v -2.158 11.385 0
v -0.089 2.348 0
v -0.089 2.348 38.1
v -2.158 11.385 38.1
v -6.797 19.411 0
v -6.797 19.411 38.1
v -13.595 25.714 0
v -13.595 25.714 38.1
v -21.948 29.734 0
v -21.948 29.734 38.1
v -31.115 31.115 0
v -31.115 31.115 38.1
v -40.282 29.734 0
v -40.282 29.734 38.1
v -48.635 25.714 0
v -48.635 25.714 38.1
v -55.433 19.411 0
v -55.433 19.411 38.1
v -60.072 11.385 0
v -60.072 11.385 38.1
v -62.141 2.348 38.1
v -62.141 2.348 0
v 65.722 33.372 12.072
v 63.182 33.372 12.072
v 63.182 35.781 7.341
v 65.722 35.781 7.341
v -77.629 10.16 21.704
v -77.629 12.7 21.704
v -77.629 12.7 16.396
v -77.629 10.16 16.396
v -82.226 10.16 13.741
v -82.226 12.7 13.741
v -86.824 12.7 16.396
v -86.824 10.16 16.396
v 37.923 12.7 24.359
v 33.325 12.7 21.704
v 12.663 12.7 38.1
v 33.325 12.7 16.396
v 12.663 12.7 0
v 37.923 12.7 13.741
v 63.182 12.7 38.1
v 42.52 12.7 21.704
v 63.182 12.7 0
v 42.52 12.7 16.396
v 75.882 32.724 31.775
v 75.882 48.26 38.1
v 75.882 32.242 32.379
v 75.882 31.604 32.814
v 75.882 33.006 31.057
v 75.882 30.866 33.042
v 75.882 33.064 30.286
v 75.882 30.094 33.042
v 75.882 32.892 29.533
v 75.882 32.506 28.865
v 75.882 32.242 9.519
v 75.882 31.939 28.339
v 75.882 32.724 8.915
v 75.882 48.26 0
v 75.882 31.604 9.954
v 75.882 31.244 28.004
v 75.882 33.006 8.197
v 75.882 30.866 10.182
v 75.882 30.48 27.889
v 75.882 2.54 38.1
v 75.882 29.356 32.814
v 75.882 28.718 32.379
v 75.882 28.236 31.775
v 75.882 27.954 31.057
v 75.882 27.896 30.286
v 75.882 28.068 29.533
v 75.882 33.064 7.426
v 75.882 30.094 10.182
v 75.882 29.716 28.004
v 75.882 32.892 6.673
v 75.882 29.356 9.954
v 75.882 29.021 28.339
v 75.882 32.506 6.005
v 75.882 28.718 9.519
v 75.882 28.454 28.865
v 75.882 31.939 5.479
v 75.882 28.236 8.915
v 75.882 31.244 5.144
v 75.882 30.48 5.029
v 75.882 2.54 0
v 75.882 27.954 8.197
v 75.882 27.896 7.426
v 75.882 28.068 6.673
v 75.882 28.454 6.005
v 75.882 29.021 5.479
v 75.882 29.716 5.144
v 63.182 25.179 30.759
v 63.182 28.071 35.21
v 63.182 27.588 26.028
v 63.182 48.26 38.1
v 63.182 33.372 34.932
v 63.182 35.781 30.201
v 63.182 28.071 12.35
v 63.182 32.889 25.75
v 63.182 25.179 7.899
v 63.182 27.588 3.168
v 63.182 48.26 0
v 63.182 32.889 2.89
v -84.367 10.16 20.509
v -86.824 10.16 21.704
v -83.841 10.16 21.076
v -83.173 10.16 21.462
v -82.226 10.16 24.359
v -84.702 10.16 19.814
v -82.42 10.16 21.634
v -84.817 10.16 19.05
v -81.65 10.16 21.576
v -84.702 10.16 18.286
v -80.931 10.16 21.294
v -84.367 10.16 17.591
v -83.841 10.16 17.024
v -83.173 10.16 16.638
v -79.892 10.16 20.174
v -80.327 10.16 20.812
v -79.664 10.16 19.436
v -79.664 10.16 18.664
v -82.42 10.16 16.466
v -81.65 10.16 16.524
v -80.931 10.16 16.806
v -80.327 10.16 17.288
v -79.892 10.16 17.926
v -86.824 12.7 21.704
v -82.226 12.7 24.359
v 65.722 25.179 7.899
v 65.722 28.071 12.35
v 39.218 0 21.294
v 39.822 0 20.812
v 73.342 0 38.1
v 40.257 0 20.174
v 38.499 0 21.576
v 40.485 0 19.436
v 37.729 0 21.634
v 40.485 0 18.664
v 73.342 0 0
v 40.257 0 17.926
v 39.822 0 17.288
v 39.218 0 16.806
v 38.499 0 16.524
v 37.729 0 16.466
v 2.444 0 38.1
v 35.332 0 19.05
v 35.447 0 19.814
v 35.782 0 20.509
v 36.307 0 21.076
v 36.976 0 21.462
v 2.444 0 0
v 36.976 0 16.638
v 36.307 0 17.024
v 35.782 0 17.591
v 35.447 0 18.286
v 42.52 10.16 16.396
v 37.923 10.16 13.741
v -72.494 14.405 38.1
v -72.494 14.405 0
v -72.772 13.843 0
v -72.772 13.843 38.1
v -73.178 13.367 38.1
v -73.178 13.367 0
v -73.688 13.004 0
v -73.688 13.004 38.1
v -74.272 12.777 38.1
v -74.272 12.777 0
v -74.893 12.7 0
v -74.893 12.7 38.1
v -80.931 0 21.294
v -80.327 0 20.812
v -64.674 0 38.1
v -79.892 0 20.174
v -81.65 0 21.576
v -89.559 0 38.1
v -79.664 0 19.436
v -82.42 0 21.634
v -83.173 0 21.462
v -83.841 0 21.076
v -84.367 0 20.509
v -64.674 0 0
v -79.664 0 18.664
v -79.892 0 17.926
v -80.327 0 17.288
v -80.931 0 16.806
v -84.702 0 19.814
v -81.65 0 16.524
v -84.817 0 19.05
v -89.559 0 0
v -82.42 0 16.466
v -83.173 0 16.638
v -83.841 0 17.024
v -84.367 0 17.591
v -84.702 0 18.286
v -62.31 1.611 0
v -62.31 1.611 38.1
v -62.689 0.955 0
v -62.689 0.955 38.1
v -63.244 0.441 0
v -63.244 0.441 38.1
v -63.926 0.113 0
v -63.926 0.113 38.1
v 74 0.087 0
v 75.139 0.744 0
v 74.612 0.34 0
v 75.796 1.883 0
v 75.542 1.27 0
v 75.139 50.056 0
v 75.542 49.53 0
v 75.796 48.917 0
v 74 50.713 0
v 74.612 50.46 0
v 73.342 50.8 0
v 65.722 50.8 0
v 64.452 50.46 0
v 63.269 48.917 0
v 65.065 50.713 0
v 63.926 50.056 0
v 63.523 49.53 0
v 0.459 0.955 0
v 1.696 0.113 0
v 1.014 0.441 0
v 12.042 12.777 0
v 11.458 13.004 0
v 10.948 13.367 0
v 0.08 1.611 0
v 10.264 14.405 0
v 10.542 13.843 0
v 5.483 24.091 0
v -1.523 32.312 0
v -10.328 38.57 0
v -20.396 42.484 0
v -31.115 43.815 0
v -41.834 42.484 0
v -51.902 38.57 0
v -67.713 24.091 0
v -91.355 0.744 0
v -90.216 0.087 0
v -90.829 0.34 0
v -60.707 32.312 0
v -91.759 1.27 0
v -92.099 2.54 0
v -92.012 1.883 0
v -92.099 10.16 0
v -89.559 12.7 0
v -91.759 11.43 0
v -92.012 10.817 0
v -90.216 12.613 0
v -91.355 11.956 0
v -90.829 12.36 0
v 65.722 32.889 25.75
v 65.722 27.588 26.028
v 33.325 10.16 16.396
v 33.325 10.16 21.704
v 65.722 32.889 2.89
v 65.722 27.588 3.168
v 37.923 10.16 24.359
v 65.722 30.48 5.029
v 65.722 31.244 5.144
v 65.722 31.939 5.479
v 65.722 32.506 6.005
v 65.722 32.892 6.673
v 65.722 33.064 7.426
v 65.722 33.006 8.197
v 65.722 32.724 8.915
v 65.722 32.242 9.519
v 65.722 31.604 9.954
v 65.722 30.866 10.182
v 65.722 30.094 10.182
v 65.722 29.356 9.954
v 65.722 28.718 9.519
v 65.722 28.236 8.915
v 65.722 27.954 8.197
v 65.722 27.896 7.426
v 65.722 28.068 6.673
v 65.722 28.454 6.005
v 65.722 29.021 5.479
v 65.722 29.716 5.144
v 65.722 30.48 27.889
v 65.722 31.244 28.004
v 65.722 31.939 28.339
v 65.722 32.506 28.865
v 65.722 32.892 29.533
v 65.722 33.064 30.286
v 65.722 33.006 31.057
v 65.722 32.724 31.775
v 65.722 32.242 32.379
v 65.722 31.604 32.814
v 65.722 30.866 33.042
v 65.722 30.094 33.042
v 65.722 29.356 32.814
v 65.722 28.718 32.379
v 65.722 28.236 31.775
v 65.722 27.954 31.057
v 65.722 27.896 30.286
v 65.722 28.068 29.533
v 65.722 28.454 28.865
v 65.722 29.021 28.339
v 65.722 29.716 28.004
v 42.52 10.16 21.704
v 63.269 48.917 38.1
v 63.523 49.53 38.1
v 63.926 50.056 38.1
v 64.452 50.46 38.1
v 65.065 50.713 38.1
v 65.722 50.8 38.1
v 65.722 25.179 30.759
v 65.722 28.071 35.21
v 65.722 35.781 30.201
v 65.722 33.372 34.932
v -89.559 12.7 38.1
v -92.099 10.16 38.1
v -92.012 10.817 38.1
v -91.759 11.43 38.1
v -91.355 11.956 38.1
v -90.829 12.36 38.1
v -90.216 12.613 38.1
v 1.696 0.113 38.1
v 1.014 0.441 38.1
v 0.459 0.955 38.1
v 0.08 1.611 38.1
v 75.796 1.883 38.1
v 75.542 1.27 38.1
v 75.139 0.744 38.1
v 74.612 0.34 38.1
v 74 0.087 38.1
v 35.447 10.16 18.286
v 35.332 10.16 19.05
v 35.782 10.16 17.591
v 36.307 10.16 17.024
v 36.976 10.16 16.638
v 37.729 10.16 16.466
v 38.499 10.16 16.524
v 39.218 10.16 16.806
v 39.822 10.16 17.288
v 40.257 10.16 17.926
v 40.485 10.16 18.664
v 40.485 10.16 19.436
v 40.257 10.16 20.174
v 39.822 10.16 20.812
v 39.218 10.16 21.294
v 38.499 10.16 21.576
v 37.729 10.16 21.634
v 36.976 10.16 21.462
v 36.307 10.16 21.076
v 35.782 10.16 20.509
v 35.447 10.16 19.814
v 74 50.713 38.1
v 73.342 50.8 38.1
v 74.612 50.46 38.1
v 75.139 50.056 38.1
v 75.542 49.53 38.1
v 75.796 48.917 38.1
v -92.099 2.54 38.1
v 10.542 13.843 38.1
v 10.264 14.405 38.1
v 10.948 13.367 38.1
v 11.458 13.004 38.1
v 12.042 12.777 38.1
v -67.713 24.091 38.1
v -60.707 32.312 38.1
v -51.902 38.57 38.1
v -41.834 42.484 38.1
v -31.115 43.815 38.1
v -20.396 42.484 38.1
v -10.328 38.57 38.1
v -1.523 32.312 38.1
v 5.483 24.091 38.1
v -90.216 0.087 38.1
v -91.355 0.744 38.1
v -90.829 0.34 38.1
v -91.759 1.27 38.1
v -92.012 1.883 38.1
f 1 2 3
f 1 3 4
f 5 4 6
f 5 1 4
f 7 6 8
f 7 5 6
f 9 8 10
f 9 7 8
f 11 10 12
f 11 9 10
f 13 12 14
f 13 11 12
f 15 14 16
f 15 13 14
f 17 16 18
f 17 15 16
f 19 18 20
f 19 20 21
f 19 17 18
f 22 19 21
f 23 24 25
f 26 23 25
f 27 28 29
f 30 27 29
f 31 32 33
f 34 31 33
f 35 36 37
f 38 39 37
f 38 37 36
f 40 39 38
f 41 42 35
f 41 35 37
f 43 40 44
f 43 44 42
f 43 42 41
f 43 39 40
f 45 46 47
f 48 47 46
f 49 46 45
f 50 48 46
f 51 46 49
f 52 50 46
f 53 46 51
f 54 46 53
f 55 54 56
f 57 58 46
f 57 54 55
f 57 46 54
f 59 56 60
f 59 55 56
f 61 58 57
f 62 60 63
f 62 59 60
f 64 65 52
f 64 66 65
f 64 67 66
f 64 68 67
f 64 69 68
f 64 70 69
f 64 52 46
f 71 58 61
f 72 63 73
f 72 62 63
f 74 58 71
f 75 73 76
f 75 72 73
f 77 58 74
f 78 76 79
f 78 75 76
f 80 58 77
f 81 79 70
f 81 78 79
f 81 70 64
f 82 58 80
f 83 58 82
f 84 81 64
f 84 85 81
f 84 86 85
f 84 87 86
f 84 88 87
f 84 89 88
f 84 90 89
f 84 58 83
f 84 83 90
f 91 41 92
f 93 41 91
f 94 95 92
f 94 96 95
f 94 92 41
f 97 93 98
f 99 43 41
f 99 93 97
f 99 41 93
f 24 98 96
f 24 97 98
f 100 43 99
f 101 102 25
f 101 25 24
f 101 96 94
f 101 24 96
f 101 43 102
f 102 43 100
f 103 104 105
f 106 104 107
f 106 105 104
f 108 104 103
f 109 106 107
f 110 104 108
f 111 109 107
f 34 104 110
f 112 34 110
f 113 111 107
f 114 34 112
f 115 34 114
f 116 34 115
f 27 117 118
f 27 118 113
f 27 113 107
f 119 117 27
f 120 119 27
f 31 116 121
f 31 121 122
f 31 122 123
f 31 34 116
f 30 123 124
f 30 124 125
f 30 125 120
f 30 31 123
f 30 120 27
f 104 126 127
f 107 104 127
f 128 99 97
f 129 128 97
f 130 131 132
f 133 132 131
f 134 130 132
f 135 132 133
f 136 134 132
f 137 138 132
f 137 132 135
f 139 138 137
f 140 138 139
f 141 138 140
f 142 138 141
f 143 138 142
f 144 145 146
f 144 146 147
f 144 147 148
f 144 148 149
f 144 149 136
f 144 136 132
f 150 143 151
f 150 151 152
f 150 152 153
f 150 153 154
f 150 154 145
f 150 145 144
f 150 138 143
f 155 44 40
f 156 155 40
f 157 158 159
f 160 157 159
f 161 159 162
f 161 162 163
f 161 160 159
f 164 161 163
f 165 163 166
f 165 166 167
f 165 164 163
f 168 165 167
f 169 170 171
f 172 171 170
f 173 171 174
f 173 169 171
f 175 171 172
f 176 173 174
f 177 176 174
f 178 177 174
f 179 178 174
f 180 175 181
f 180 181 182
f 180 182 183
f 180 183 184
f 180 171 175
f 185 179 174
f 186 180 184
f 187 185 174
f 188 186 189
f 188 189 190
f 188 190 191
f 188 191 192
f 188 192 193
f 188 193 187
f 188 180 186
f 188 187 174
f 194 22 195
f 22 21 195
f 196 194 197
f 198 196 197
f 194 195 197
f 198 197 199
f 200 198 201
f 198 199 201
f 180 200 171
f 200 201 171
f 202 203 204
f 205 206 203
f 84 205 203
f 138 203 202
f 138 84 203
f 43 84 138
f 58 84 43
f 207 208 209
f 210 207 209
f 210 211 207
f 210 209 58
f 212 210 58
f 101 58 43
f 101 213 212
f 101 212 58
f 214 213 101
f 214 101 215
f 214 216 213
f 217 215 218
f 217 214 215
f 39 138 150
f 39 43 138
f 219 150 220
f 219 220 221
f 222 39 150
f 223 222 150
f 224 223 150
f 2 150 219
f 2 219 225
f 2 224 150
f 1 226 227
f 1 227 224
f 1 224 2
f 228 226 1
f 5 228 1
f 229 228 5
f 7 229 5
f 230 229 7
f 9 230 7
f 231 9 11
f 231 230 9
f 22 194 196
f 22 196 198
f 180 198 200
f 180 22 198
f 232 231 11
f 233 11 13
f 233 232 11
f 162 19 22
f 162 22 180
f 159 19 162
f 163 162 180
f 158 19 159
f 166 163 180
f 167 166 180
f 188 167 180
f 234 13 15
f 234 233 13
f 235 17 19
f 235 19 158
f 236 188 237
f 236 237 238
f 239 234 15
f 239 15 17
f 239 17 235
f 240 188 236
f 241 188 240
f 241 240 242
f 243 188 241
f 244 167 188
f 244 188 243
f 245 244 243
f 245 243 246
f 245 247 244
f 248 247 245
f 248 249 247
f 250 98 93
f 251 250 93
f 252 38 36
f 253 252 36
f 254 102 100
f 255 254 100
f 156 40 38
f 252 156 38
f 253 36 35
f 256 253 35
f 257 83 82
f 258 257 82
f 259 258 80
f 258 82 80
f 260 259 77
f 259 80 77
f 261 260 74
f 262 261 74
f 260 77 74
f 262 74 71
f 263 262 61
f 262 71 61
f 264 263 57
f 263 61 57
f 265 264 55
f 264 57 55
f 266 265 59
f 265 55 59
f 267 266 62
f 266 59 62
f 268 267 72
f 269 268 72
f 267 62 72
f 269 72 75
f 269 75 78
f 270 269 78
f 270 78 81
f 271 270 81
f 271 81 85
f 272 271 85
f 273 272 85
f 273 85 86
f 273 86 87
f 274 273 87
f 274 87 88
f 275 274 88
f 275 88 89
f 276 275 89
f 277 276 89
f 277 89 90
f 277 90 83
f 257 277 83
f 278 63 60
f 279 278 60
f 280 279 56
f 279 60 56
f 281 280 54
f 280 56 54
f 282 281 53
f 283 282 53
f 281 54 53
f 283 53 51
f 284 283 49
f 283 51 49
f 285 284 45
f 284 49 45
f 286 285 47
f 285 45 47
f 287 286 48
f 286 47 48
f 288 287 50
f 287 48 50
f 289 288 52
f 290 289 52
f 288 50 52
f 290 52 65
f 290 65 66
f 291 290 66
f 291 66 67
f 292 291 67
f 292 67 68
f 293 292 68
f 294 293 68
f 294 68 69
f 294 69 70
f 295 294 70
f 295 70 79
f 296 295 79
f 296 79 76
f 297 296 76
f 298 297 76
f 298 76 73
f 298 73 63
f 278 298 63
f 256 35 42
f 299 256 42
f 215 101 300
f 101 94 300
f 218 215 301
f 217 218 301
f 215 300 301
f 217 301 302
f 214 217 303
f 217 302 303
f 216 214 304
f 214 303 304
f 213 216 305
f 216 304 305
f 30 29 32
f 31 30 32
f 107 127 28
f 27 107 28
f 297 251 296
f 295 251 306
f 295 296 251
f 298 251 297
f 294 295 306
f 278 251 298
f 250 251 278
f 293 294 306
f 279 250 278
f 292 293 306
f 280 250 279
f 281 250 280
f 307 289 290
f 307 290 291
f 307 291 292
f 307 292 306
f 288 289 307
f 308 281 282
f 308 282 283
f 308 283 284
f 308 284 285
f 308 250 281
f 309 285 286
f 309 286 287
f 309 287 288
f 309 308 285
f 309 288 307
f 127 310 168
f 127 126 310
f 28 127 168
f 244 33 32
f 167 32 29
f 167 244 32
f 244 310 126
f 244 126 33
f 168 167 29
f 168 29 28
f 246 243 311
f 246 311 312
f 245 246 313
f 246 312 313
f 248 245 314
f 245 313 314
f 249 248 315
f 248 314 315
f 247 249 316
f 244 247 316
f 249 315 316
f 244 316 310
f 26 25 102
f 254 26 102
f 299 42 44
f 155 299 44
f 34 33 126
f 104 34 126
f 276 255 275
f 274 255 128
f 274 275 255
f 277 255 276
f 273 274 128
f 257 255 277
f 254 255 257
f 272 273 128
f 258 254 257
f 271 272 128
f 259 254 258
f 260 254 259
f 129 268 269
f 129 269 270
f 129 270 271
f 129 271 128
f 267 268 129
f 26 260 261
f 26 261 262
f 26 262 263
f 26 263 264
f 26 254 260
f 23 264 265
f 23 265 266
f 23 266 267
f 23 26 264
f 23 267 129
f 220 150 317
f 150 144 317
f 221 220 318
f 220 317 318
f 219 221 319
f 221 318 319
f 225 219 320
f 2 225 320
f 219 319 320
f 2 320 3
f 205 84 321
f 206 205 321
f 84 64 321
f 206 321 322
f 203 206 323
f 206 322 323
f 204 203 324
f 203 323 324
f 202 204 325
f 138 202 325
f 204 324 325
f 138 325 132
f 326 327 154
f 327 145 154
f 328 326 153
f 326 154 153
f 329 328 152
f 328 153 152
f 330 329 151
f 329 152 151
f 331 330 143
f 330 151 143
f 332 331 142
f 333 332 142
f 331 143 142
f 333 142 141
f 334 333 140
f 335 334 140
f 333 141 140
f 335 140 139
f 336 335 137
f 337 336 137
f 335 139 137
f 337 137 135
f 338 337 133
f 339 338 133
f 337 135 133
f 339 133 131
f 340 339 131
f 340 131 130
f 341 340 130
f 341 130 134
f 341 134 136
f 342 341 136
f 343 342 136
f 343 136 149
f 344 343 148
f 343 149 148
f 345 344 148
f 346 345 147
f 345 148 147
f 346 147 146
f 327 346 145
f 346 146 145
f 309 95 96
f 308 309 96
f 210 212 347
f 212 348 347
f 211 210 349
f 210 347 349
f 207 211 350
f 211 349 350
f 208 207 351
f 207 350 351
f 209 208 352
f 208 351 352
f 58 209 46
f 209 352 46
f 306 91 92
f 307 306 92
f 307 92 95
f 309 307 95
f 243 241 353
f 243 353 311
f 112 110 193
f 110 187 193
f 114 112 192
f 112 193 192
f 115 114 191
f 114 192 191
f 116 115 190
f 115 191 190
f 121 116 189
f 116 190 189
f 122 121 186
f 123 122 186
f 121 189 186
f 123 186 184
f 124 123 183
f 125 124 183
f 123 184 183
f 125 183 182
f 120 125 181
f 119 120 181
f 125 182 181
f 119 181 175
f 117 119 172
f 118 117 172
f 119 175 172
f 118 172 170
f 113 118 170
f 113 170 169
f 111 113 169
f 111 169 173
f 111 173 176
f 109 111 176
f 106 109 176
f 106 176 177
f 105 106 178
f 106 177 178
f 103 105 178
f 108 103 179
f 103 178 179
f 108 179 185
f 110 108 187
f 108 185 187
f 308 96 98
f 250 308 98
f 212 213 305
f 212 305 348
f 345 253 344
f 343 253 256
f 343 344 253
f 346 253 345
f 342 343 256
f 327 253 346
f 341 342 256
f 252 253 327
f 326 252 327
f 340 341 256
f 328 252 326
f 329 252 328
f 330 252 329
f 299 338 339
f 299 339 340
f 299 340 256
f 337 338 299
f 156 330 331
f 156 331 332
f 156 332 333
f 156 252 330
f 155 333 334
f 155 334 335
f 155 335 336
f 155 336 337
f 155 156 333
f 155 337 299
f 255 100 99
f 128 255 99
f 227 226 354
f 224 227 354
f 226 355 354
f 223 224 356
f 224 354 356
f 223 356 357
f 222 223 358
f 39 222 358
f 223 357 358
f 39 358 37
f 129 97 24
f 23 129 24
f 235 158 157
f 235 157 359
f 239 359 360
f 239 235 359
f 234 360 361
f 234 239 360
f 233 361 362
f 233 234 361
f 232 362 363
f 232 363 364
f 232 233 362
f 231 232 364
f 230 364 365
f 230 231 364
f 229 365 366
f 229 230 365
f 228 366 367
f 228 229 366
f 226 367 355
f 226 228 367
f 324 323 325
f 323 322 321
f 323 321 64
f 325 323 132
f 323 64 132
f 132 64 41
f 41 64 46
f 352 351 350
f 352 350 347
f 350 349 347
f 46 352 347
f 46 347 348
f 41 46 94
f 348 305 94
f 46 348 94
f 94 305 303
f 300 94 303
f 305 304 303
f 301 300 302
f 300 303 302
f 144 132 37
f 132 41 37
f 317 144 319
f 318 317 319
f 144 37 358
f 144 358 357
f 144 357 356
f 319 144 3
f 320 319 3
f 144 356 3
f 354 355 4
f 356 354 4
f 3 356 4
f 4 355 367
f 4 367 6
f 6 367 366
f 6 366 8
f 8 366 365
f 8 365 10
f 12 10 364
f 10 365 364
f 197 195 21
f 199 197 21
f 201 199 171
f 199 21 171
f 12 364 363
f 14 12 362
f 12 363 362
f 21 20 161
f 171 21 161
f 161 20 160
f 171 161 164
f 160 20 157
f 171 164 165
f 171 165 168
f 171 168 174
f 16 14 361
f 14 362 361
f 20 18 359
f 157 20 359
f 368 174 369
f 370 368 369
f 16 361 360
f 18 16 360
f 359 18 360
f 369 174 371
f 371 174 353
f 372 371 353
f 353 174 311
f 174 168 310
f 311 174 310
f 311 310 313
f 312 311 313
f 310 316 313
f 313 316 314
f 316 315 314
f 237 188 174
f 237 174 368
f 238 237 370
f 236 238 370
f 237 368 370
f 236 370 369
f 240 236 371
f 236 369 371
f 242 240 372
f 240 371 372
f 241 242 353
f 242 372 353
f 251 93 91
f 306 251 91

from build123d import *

# Parameters (mm, degrees)
BOSS_EXTRUDE1_DEPTH            = 38.1
FILLET1_R                      = 2.54
CUT_EXTRUDE1_DEPTH             = 2.54
F_6_0_204_DIAMETER_HOLE1_D     = 5.1816
F_6_0_204_DIAMETER_HOLE1_DEPTH = 12.7
F_6_0_204_DIAMETER_HOLE1_TIP   = 1.556709692
CUT_EXTRUDE2_DEPTH             = 2.54
F_6_0_204_DIAMETER_HOLE2_D     = 5.1816
F_6_0_204_DIAMETER_HOLE2_DEPTH = 12.7
F_6_0_204_DIAMETER_HOLE2_TIP   = 1.556709692


with BuildPart() as part:
    # Sketch1 → Boss-Extrude1 (new body)
    with BuildSketch(Plane.XY):
        with BuildLine():
            ThreePointArc((-73.049046132, 12.7), (-31.115, 43.815), (10.819046132, 12.7))
            Line((10.819046132, 12.7), (63.1825, 12.7))
            Line((63.1825, 12.7), (63.1825, 50.8))
            Line((63.1825, 50.8), (75.8825, 50.8))
            Line((75.8825, 50.8), (75.8825, 0))
            Line((75.8825, 0), (0, 0))
            ThreePointArc((0, 0), (-31.115, 31.115), (-62.23, 0))
            Line((-62.23, 0), (-92.099046132, 0))
            Line((-92.099046132, 0), (-92.099046132, 12.7))
            Line((-92.099046132, 12.7), (-73.049046132, 12.7))
        make_face()
    extrude(amount=BOSS_EXTRUDE1_DEPTH)

    # Fillet1
    fillet1_edges = [part.edges().sort_by_distance(p)[0] for p in [
        (10.819046132, 12.7, 19.05),
        (63.1825, 50.8, 19.05),
        (75.8825, 50.8, 19.05),
        (75.8825, 0, 19.05),
        (0, 0, 19.05),
        (-62.23, 0, 19.05),
        (-92.099046132, 0, 19.05),
        (-92.099046132, 12.7, 19.05),
        (-73.049046132, 12.7, 19.05),
    ]]
    fillet(fillet1_edges, radius=FILLET1_R)

    # Sketch3 → Cut-Extrude1 (cut)
    with BuildSketch(Plane(origin=(0, 12.7, 0), x_dir=(1, 0, 0), z_dir=(0, 1, 0))):
        Polygon((33.325436464, -16.395689872), (33.325436464, -21.704310128), (37.922836464, -24.358620255), (42.520236464, -21.704310128), (42.520236464, -16.395689872), (37.922836464, -13.741379745), align=None)
        Polygon((-82.22610953, -13.741379745), (-86.82350953, -16.395689872), (-86.82350953, -21.704310128), (-82.22610953, -24.358620255), (-77.62870953, -21.704310128), (-77.62870953, -16.395689872), align=None)
    extrude(amount=-CUT_EXTRUDE1_DEPTH, mode=Mode.SUBTRACT)

    # #6 (0.204) Diameter Hole1
    with Locations(Plane(origin=(0, 12.7, 0), x_dir=(1, 0, 0), z_dir=(0, 1, 0))):
        with Locations((-82.22610953, -19.05), (37.922836464, -19.05)):
            Hole(F_6_0_204_DIAMETER_HOLE1_D / 2, depth=F_6_0_204_DIAMETER_HOLE1_DEPTH)
            with Locations((0, 0, -(F_6_0_204_DIAMETER_HOLE1_DEPTH + F_6_0_204_DIAMETER_HOLE1_TIP / 2))):  # 118° drill point
                Cone(0, F_6_0_204_DIAMETER_HOLE1_D / 2, F_6_0_204_DIAMETER_HOLE1_TIP, mode=Mode.SUBTRACT)

    # Sketch6 → Cut-Extrude2 (cut)
    with BuildSketch(Plane.ZY.offset(-63.1825)):
        Polygon((12.350437166, 28.070765011), (12.071677287, 33.372061262), (7.341240122, 35.781296251), (2.889562834, 32.889234989), (3.168322713, 27.587938738), (7.898759878, 25.178703749), align=None)
        Polygon((35.210437166, 28.070765011), (34.931677287, 33.372061262), (30.201240122, 35.781296251), (25.749562834, 32.889234989), (26.028322713, 27.587938738), (30.758759878, 25.178703749), align=None)
    extrude(amount=-CUT_EXTRUDE2_DEPTH, mode=Mode.SUBTRACT)

    # #6 (0.204) Diameter Hole2
    with Locations(Plane.ZY.offset(-65.7225)):
        with Locations((30.48, 30.48), (7.62, 30.48)):
            Hole(F_6_0_204_DIAMETER_HOLE2_D / 2, depth=F_6_0_204_DIAMETER_HOLE2_DEPTH)
            with Locations((0, 0, -(F_6_0_204_DIAMETER_HOLE2_DEPTH + F_6_0_204_DIAMETER_HOLE2_TIP / 2))):  # 118° drill point
                Cone(0, F_6_0_204_DIAMETER_HOLE2_D / 2, F_6_0_204_DIAMETER_HOLE2_TIP, mode=Mode.SUBTRACT)


solid = part.part
